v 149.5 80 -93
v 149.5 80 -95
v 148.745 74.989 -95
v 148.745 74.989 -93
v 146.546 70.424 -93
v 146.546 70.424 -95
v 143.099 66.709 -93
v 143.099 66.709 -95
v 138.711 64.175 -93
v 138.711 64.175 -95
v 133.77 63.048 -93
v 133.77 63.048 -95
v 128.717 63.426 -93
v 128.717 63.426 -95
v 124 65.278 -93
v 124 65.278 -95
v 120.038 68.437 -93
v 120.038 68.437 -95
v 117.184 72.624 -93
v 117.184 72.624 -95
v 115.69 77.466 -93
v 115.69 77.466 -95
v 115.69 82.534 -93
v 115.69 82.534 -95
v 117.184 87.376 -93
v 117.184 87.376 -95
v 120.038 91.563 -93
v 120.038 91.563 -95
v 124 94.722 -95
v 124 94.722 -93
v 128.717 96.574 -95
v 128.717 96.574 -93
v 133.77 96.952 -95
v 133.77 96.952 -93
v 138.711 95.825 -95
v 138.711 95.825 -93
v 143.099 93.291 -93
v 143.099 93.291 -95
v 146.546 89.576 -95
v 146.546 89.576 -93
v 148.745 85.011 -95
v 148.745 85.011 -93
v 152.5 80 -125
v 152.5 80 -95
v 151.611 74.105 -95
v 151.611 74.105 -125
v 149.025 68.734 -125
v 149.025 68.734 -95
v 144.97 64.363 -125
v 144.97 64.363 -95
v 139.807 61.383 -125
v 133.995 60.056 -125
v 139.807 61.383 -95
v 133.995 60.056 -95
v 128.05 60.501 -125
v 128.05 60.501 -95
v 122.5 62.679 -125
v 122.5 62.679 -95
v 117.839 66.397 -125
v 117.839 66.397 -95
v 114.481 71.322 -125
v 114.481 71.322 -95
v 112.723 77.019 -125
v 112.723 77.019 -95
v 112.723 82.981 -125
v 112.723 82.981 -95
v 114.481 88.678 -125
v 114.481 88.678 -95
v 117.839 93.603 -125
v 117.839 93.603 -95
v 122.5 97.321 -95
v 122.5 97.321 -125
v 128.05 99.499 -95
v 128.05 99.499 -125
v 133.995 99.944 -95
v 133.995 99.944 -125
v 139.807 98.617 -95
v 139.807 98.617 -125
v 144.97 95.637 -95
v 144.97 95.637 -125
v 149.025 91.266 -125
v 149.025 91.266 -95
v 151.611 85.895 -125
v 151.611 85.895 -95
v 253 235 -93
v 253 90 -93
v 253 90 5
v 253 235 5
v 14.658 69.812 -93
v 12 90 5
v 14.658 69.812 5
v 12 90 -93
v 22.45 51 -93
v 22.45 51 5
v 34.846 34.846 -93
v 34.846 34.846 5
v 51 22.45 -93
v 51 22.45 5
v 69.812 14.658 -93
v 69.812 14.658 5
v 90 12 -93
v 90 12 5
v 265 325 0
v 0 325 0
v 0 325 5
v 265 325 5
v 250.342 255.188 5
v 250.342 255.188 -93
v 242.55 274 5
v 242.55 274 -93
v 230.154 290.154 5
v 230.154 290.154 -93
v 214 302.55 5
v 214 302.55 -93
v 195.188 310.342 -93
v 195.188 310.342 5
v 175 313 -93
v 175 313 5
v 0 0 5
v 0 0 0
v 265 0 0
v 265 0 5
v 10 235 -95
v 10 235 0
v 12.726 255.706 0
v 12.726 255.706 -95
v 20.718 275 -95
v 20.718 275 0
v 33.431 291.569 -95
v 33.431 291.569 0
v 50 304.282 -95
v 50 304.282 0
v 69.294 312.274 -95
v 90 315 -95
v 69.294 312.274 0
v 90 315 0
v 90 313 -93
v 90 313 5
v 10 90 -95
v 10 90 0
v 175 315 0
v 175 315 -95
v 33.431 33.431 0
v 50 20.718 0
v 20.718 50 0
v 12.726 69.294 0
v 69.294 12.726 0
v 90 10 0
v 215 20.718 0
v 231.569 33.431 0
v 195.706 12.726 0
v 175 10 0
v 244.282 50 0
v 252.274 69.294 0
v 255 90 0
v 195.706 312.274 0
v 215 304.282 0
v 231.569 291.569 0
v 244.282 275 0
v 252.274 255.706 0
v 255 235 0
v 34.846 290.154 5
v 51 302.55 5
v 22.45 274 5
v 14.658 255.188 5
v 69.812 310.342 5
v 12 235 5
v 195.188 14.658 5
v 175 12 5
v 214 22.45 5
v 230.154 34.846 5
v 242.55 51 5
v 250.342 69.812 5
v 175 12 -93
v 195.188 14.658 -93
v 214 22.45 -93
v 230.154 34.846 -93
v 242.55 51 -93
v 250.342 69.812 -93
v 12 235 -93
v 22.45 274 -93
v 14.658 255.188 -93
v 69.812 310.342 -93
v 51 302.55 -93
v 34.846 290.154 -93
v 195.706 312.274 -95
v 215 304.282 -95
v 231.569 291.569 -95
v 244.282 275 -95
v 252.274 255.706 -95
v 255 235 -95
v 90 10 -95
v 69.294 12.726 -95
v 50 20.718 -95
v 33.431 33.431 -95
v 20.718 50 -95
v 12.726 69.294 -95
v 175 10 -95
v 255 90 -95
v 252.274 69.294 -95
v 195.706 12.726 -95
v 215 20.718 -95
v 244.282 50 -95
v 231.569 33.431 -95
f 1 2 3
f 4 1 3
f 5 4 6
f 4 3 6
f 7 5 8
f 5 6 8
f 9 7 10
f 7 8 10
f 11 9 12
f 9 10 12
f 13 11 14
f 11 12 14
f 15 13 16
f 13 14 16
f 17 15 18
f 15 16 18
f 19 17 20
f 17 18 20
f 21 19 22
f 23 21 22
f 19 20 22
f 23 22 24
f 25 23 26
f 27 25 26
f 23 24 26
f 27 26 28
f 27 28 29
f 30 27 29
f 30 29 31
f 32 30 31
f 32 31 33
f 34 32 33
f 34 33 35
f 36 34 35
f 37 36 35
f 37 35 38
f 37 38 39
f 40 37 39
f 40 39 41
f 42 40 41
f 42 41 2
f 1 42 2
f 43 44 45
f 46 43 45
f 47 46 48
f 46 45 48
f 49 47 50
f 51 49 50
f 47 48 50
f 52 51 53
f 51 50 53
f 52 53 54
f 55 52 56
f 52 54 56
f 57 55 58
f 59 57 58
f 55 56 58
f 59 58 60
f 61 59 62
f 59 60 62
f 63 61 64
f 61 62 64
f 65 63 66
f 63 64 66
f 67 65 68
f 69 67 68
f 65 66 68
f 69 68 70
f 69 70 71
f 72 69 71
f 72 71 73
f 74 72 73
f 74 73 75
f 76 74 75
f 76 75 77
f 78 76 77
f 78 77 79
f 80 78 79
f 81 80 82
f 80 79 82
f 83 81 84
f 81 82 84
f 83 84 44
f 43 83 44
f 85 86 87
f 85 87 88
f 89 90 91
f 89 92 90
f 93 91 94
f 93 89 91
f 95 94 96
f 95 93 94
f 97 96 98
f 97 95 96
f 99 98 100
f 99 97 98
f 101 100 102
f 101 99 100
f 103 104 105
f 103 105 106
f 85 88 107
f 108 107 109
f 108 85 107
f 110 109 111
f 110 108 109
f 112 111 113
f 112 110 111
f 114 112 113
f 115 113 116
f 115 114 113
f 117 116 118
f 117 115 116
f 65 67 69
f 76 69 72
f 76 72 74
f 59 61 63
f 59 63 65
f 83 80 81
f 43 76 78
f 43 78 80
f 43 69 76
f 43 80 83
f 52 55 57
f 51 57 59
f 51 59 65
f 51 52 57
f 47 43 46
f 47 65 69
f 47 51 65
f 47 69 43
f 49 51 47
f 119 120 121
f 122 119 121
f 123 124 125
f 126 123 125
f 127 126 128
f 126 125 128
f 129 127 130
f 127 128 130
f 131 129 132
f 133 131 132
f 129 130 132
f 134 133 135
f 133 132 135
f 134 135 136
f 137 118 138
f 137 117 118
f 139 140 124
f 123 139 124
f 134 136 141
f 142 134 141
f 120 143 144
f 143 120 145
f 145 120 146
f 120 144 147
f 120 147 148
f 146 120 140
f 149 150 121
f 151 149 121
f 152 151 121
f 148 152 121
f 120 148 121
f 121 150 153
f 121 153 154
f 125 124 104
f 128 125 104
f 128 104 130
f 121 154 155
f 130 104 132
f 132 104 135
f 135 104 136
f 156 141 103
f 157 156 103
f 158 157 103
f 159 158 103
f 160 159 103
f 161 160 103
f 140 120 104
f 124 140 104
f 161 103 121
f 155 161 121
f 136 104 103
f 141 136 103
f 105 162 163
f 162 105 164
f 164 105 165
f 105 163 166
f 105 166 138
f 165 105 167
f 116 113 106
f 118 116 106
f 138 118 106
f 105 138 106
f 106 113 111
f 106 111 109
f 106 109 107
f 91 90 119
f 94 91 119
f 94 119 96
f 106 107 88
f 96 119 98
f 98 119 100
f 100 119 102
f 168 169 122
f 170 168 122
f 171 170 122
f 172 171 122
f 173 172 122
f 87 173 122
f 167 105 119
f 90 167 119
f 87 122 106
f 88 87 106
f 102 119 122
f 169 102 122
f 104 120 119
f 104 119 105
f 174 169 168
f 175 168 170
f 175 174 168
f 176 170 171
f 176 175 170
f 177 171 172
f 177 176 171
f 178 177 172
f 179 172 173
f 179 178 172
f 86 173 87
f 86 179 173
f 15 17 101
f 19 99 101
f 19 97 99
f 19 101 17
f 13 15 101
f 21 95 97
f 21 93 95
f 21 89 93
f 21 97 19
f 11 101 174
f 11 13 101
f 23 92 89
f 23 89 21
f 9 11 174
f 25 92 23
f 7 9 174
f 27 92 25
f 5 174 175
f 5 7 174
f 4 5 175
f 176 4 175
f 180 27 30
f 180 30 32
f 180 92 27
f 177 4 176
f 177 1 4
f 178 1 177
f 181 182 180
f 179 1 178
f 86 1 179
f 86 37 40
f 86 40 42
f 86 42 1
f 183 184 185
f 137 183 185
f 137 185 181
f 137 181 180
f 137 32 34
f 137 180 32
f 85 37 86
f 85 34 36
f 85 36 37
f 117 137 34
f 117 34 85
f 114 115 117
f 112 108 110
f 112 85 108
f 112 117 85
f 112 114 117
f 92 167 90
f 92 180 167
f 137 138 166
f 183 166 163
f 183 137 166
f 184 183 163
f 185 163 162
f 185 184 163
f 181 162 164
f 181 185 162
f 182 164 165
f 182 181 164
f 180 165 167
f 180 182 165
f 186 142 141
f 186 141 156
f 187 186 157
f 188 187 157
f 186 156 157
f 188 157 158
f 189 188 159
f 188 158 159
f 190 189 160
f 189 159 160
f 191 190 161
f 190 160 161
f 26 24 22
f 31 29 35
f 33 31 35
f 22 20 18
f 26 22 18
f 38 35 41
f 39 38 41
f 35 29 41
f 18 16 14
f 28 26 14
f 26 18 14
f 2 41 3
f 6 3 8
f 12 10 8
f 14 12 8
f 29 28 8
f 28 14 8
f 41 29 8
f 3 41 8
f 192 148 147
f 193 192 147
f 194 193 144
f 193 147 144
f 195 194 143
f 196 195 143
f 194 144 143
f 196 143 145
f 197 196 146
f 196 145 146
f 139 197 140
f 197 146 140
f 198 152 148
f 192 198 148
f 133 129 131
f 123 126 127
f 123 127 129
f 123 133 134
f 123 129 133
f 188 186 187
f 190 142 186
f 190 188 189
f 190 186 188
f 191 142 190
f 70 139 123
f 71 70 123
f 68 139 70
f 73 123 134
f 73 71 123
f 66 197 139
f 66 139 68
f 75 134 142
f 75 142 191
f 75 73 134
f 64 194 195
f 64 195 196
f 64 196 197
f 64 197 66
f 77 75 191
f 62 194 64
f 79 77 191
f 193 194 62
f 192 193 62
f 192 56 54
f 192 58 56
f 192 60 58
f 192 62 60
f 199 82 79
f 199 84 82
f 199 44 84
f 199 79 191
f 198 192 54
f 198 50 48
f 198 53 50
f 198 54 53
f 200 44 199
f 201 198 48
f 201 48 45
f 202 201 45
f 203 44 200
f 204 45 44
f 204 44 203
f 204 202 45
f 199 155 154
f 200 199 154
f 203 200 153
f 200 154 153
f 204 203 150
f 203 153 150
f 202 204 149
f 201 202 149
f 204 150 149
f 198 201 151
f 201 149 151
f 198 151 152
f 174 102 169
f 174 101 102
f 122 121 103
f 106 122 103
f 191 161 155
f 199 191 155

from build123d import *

# Parameters (mm, degrees)
F0_W     = 265
F0_H     = 325
F1_DEPTH = 5
F3_DEPTH = 95
F4_DEPTH = 25
F5_DEPTH = 98
F6_R     = 17
F7_DEPTH = 25
F6_R_2   = 20
F8_DEPTH = 30
F9_DEPTH = 5


with BuildPart() as f1:
    # F0 (on Top) → F1 (new body)
    with BuildSketch(Plane.XY):
        with Locations((132.5, 162.5)):
            Rectangle(F0_W, F0_H)
    extrude(amount=F1_DEPTH)

    # F2 (on face) → F3 (join)
    with BuildSketch(Plane(origin=(0, 0, 0), x_dir=(1, 0, 0), z_dir=(0, 0, -1))):
        with BuildLine():
            ThreePointArc((255, -90), (231.5685424949, -33.4314575051), (175, -10))
            Line((175, -10), (90, -10))
            ThreePointArc((90, -10), (33.4314575051, -33.4314575051), (10, -90))
            Line((10, -90), (10, -235))
            ThreePointArc((10, -235), (33.4314575051, -291.5685424949), (90, -315))
            Line((90, -315), (175, -315))
            ThreePointArc((175, -315), (231.5685424949, -291.5685424949), (255, -235))
            Line((255, -235), (255, -90))
        make_face()
        with BuildLine():
            ThreePointArc((175, -12), (230.1543289326, -34.8456710674), (253, -90))
            Line((253, -90), (253, -235))
            ThreePointArc((253, -235), (230.1543289326, -290.1543289326), (175, -313))
            Line((175, -313), (90, -313))
            ThreePointArc((90, -313), (34.8456710674, -290.1543289326), (12, -235))
            Line((12, -235), (12, -90))
            ThreePointArc((12, -90), (34.8456710674, -34.8456710674), (90, -12))
            Line((90, -12), (175, -12))
        make_face(mode=Mode.SUBTRACT)
        with BuildLine():
            Line((253, -235), (253, -90))
            ThreePointArc((253, -90), (230.1543289326, -34.8456710674), (175, -12))
            Line((175, -12), (90, -12))
            ThreePointArc((90, -12), (34.8456710674, -34.8456710674), (12, -90))
            Line((12, -90), (12, -235))
            ThreePointArc((12, -235), (34.8456710674, -290.1543289326), (90, -313))
            Line((90, -313), (175, -313))
            ThreePointArc((175, -313), (230.1543289326, -290.1543289326), (253, -235))
        make_face()
    extrude(amount=F3_DEPTH)

    # F2 (on face) → F4 (cut)
    with BuildSketch(Plane(origin=(0, 0, 0), x_dir=(1, 0, 0), z_dir=(0, 0, -1))):
        with BuildLine():
            ThreePointArc((255, -90), (231.5685424949, -33.4314575051), (175, -10))
            Line((175, -10), (90, -10))
            ThreePointArc((90, -10), (33.4314575051, -33.4314575051), (10, -90))
            Line((10, -90), (10, -235))
            ThreePointArc((10, -235), (33.4314575051, -291.5685424949), (90, -315))
            Line((90, -315), (175, -315))
            ThreePointArc((175, -315), (231.5685424949, -291.5685424949), (255, -235))
            Line((255, -235), (255, -90))
        make_face()
        with BuildLine():
            ThreePointArc((175, -12), (230.1543289326, -34.8456710674), (253, -90))
            Line((253, -90), (253, -235))
            ThreePointArc((253, -235), (230.1543289326, -290.1543289326), (175, -313))
            Line((175, -313), (90, -313))
            ThreePointArc((90, -313), (34.8456710674, -290.1543289326), (12, -235))
            Line((12, -235), (12, -90))
            ThreePointArc((12, -90), (34.8456710674, -34.8456710674), (90, -12))
            Line((90, -12), (175, -12))
        make_face(mode=Mode.SUBTRACT)
    extrude(amount=-F4_DEPTH, mode=Mode.SUBTRACT)

    # F5 (cut): a face of the model
    f5_faces = [f1.faces().sort_by_distance(p)[0] for p in [
        (132.5, 162.5, 5),
    ]]
    extrude(f5_faces, amount=-F5_DEPTH, mode=Mode.SUBTRACT)

    # F6 (on face) → F7 (cut)
    with BuildSketch(Plane(origin=(0, 0, -95), x_dir=(1, 0, 0), z_dir=(0, 0, -1))):
        with Locations((132.5, -80)):
            Circle(F6_R)
    extrude(amount=-F7_DEPTH, mode=Mode.SUBTRACT)

    # F6 (on face) → F8 (join)
    with BuildSketch(Plane(origin=(0, 0, -95), x_dir=(1, 0, 0), z_dir=(0, 0, -1))):
        with Locations((132.5, -80)):
            Circle(F6_R_2)
        with Locations((132.5, -80)):
            Circle(F6_R, mode=Mode.SUBTRACT)
        with Locations((132.5, -80)):
            Circle(F6_R)
    extrude(amount=F8_DEPTH)

    # F9 (add): a face of the model
    f9_faces = [f1.faces().sort_by_distance(p)[0] for p in [
        (231.2919109711, 33.7080890289, 0),
    ]]
    extrude(f9_faces, amount=F9_DEPTH)


solid = f1.part
